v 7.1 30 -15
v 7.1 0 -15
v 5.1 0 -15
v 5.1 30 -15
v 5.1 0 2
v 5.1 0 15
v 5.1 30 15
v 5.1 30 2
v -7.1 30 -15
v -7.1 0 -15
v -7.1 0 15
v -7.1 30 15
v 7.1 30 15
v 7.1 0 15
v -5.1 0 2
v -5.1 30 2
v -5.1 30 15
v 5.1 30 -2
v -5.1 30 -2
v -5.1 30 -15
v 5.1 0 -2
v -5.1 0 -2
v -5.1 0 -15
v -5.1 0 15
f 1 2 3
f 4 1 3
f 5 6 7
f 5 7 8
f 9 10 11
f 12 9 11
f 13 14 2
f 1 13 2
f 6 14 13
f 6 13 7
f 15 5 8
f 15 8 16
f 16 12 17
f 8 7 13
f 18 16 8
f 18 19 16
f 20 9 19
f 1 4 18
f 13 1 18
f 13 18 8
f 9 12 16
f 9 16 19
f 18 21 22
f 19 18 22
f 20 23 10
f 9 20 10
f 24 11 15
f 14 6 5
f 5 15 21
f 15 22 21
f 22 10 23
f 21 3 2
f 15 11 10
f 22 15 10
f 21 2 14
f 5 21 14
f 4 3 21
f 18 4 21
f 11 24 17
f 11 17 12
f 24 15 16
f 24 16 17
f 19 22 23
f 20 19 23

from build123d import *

# Parameters (mm, degrees)
F1_DEPTH = 30


with BuildPart() as f1:
    # F0 (on Front) → F1 (new body)
    with BuildSketch(Plane.XZ):
        Polygon((-7.1, 2), (-7.1, 0), (7.1, 0), (7.1, 2), (7.1, 15), (5.1, 15), (5.1, 2), (-5.1, 2), (-5.1, 15), (-7.1, 15), align=None)
    extrude(amount=-F1_DEPTH)

    # F2: F1 across face


with BuildPart() as f1_1:
    add(f1.part)
    add(f1.part.mirror(Plane(origin=(0, 15, 0), x_dir=(1, 0, 0), z_dir=(0, 0, -1))))


solid = f1_1.part
